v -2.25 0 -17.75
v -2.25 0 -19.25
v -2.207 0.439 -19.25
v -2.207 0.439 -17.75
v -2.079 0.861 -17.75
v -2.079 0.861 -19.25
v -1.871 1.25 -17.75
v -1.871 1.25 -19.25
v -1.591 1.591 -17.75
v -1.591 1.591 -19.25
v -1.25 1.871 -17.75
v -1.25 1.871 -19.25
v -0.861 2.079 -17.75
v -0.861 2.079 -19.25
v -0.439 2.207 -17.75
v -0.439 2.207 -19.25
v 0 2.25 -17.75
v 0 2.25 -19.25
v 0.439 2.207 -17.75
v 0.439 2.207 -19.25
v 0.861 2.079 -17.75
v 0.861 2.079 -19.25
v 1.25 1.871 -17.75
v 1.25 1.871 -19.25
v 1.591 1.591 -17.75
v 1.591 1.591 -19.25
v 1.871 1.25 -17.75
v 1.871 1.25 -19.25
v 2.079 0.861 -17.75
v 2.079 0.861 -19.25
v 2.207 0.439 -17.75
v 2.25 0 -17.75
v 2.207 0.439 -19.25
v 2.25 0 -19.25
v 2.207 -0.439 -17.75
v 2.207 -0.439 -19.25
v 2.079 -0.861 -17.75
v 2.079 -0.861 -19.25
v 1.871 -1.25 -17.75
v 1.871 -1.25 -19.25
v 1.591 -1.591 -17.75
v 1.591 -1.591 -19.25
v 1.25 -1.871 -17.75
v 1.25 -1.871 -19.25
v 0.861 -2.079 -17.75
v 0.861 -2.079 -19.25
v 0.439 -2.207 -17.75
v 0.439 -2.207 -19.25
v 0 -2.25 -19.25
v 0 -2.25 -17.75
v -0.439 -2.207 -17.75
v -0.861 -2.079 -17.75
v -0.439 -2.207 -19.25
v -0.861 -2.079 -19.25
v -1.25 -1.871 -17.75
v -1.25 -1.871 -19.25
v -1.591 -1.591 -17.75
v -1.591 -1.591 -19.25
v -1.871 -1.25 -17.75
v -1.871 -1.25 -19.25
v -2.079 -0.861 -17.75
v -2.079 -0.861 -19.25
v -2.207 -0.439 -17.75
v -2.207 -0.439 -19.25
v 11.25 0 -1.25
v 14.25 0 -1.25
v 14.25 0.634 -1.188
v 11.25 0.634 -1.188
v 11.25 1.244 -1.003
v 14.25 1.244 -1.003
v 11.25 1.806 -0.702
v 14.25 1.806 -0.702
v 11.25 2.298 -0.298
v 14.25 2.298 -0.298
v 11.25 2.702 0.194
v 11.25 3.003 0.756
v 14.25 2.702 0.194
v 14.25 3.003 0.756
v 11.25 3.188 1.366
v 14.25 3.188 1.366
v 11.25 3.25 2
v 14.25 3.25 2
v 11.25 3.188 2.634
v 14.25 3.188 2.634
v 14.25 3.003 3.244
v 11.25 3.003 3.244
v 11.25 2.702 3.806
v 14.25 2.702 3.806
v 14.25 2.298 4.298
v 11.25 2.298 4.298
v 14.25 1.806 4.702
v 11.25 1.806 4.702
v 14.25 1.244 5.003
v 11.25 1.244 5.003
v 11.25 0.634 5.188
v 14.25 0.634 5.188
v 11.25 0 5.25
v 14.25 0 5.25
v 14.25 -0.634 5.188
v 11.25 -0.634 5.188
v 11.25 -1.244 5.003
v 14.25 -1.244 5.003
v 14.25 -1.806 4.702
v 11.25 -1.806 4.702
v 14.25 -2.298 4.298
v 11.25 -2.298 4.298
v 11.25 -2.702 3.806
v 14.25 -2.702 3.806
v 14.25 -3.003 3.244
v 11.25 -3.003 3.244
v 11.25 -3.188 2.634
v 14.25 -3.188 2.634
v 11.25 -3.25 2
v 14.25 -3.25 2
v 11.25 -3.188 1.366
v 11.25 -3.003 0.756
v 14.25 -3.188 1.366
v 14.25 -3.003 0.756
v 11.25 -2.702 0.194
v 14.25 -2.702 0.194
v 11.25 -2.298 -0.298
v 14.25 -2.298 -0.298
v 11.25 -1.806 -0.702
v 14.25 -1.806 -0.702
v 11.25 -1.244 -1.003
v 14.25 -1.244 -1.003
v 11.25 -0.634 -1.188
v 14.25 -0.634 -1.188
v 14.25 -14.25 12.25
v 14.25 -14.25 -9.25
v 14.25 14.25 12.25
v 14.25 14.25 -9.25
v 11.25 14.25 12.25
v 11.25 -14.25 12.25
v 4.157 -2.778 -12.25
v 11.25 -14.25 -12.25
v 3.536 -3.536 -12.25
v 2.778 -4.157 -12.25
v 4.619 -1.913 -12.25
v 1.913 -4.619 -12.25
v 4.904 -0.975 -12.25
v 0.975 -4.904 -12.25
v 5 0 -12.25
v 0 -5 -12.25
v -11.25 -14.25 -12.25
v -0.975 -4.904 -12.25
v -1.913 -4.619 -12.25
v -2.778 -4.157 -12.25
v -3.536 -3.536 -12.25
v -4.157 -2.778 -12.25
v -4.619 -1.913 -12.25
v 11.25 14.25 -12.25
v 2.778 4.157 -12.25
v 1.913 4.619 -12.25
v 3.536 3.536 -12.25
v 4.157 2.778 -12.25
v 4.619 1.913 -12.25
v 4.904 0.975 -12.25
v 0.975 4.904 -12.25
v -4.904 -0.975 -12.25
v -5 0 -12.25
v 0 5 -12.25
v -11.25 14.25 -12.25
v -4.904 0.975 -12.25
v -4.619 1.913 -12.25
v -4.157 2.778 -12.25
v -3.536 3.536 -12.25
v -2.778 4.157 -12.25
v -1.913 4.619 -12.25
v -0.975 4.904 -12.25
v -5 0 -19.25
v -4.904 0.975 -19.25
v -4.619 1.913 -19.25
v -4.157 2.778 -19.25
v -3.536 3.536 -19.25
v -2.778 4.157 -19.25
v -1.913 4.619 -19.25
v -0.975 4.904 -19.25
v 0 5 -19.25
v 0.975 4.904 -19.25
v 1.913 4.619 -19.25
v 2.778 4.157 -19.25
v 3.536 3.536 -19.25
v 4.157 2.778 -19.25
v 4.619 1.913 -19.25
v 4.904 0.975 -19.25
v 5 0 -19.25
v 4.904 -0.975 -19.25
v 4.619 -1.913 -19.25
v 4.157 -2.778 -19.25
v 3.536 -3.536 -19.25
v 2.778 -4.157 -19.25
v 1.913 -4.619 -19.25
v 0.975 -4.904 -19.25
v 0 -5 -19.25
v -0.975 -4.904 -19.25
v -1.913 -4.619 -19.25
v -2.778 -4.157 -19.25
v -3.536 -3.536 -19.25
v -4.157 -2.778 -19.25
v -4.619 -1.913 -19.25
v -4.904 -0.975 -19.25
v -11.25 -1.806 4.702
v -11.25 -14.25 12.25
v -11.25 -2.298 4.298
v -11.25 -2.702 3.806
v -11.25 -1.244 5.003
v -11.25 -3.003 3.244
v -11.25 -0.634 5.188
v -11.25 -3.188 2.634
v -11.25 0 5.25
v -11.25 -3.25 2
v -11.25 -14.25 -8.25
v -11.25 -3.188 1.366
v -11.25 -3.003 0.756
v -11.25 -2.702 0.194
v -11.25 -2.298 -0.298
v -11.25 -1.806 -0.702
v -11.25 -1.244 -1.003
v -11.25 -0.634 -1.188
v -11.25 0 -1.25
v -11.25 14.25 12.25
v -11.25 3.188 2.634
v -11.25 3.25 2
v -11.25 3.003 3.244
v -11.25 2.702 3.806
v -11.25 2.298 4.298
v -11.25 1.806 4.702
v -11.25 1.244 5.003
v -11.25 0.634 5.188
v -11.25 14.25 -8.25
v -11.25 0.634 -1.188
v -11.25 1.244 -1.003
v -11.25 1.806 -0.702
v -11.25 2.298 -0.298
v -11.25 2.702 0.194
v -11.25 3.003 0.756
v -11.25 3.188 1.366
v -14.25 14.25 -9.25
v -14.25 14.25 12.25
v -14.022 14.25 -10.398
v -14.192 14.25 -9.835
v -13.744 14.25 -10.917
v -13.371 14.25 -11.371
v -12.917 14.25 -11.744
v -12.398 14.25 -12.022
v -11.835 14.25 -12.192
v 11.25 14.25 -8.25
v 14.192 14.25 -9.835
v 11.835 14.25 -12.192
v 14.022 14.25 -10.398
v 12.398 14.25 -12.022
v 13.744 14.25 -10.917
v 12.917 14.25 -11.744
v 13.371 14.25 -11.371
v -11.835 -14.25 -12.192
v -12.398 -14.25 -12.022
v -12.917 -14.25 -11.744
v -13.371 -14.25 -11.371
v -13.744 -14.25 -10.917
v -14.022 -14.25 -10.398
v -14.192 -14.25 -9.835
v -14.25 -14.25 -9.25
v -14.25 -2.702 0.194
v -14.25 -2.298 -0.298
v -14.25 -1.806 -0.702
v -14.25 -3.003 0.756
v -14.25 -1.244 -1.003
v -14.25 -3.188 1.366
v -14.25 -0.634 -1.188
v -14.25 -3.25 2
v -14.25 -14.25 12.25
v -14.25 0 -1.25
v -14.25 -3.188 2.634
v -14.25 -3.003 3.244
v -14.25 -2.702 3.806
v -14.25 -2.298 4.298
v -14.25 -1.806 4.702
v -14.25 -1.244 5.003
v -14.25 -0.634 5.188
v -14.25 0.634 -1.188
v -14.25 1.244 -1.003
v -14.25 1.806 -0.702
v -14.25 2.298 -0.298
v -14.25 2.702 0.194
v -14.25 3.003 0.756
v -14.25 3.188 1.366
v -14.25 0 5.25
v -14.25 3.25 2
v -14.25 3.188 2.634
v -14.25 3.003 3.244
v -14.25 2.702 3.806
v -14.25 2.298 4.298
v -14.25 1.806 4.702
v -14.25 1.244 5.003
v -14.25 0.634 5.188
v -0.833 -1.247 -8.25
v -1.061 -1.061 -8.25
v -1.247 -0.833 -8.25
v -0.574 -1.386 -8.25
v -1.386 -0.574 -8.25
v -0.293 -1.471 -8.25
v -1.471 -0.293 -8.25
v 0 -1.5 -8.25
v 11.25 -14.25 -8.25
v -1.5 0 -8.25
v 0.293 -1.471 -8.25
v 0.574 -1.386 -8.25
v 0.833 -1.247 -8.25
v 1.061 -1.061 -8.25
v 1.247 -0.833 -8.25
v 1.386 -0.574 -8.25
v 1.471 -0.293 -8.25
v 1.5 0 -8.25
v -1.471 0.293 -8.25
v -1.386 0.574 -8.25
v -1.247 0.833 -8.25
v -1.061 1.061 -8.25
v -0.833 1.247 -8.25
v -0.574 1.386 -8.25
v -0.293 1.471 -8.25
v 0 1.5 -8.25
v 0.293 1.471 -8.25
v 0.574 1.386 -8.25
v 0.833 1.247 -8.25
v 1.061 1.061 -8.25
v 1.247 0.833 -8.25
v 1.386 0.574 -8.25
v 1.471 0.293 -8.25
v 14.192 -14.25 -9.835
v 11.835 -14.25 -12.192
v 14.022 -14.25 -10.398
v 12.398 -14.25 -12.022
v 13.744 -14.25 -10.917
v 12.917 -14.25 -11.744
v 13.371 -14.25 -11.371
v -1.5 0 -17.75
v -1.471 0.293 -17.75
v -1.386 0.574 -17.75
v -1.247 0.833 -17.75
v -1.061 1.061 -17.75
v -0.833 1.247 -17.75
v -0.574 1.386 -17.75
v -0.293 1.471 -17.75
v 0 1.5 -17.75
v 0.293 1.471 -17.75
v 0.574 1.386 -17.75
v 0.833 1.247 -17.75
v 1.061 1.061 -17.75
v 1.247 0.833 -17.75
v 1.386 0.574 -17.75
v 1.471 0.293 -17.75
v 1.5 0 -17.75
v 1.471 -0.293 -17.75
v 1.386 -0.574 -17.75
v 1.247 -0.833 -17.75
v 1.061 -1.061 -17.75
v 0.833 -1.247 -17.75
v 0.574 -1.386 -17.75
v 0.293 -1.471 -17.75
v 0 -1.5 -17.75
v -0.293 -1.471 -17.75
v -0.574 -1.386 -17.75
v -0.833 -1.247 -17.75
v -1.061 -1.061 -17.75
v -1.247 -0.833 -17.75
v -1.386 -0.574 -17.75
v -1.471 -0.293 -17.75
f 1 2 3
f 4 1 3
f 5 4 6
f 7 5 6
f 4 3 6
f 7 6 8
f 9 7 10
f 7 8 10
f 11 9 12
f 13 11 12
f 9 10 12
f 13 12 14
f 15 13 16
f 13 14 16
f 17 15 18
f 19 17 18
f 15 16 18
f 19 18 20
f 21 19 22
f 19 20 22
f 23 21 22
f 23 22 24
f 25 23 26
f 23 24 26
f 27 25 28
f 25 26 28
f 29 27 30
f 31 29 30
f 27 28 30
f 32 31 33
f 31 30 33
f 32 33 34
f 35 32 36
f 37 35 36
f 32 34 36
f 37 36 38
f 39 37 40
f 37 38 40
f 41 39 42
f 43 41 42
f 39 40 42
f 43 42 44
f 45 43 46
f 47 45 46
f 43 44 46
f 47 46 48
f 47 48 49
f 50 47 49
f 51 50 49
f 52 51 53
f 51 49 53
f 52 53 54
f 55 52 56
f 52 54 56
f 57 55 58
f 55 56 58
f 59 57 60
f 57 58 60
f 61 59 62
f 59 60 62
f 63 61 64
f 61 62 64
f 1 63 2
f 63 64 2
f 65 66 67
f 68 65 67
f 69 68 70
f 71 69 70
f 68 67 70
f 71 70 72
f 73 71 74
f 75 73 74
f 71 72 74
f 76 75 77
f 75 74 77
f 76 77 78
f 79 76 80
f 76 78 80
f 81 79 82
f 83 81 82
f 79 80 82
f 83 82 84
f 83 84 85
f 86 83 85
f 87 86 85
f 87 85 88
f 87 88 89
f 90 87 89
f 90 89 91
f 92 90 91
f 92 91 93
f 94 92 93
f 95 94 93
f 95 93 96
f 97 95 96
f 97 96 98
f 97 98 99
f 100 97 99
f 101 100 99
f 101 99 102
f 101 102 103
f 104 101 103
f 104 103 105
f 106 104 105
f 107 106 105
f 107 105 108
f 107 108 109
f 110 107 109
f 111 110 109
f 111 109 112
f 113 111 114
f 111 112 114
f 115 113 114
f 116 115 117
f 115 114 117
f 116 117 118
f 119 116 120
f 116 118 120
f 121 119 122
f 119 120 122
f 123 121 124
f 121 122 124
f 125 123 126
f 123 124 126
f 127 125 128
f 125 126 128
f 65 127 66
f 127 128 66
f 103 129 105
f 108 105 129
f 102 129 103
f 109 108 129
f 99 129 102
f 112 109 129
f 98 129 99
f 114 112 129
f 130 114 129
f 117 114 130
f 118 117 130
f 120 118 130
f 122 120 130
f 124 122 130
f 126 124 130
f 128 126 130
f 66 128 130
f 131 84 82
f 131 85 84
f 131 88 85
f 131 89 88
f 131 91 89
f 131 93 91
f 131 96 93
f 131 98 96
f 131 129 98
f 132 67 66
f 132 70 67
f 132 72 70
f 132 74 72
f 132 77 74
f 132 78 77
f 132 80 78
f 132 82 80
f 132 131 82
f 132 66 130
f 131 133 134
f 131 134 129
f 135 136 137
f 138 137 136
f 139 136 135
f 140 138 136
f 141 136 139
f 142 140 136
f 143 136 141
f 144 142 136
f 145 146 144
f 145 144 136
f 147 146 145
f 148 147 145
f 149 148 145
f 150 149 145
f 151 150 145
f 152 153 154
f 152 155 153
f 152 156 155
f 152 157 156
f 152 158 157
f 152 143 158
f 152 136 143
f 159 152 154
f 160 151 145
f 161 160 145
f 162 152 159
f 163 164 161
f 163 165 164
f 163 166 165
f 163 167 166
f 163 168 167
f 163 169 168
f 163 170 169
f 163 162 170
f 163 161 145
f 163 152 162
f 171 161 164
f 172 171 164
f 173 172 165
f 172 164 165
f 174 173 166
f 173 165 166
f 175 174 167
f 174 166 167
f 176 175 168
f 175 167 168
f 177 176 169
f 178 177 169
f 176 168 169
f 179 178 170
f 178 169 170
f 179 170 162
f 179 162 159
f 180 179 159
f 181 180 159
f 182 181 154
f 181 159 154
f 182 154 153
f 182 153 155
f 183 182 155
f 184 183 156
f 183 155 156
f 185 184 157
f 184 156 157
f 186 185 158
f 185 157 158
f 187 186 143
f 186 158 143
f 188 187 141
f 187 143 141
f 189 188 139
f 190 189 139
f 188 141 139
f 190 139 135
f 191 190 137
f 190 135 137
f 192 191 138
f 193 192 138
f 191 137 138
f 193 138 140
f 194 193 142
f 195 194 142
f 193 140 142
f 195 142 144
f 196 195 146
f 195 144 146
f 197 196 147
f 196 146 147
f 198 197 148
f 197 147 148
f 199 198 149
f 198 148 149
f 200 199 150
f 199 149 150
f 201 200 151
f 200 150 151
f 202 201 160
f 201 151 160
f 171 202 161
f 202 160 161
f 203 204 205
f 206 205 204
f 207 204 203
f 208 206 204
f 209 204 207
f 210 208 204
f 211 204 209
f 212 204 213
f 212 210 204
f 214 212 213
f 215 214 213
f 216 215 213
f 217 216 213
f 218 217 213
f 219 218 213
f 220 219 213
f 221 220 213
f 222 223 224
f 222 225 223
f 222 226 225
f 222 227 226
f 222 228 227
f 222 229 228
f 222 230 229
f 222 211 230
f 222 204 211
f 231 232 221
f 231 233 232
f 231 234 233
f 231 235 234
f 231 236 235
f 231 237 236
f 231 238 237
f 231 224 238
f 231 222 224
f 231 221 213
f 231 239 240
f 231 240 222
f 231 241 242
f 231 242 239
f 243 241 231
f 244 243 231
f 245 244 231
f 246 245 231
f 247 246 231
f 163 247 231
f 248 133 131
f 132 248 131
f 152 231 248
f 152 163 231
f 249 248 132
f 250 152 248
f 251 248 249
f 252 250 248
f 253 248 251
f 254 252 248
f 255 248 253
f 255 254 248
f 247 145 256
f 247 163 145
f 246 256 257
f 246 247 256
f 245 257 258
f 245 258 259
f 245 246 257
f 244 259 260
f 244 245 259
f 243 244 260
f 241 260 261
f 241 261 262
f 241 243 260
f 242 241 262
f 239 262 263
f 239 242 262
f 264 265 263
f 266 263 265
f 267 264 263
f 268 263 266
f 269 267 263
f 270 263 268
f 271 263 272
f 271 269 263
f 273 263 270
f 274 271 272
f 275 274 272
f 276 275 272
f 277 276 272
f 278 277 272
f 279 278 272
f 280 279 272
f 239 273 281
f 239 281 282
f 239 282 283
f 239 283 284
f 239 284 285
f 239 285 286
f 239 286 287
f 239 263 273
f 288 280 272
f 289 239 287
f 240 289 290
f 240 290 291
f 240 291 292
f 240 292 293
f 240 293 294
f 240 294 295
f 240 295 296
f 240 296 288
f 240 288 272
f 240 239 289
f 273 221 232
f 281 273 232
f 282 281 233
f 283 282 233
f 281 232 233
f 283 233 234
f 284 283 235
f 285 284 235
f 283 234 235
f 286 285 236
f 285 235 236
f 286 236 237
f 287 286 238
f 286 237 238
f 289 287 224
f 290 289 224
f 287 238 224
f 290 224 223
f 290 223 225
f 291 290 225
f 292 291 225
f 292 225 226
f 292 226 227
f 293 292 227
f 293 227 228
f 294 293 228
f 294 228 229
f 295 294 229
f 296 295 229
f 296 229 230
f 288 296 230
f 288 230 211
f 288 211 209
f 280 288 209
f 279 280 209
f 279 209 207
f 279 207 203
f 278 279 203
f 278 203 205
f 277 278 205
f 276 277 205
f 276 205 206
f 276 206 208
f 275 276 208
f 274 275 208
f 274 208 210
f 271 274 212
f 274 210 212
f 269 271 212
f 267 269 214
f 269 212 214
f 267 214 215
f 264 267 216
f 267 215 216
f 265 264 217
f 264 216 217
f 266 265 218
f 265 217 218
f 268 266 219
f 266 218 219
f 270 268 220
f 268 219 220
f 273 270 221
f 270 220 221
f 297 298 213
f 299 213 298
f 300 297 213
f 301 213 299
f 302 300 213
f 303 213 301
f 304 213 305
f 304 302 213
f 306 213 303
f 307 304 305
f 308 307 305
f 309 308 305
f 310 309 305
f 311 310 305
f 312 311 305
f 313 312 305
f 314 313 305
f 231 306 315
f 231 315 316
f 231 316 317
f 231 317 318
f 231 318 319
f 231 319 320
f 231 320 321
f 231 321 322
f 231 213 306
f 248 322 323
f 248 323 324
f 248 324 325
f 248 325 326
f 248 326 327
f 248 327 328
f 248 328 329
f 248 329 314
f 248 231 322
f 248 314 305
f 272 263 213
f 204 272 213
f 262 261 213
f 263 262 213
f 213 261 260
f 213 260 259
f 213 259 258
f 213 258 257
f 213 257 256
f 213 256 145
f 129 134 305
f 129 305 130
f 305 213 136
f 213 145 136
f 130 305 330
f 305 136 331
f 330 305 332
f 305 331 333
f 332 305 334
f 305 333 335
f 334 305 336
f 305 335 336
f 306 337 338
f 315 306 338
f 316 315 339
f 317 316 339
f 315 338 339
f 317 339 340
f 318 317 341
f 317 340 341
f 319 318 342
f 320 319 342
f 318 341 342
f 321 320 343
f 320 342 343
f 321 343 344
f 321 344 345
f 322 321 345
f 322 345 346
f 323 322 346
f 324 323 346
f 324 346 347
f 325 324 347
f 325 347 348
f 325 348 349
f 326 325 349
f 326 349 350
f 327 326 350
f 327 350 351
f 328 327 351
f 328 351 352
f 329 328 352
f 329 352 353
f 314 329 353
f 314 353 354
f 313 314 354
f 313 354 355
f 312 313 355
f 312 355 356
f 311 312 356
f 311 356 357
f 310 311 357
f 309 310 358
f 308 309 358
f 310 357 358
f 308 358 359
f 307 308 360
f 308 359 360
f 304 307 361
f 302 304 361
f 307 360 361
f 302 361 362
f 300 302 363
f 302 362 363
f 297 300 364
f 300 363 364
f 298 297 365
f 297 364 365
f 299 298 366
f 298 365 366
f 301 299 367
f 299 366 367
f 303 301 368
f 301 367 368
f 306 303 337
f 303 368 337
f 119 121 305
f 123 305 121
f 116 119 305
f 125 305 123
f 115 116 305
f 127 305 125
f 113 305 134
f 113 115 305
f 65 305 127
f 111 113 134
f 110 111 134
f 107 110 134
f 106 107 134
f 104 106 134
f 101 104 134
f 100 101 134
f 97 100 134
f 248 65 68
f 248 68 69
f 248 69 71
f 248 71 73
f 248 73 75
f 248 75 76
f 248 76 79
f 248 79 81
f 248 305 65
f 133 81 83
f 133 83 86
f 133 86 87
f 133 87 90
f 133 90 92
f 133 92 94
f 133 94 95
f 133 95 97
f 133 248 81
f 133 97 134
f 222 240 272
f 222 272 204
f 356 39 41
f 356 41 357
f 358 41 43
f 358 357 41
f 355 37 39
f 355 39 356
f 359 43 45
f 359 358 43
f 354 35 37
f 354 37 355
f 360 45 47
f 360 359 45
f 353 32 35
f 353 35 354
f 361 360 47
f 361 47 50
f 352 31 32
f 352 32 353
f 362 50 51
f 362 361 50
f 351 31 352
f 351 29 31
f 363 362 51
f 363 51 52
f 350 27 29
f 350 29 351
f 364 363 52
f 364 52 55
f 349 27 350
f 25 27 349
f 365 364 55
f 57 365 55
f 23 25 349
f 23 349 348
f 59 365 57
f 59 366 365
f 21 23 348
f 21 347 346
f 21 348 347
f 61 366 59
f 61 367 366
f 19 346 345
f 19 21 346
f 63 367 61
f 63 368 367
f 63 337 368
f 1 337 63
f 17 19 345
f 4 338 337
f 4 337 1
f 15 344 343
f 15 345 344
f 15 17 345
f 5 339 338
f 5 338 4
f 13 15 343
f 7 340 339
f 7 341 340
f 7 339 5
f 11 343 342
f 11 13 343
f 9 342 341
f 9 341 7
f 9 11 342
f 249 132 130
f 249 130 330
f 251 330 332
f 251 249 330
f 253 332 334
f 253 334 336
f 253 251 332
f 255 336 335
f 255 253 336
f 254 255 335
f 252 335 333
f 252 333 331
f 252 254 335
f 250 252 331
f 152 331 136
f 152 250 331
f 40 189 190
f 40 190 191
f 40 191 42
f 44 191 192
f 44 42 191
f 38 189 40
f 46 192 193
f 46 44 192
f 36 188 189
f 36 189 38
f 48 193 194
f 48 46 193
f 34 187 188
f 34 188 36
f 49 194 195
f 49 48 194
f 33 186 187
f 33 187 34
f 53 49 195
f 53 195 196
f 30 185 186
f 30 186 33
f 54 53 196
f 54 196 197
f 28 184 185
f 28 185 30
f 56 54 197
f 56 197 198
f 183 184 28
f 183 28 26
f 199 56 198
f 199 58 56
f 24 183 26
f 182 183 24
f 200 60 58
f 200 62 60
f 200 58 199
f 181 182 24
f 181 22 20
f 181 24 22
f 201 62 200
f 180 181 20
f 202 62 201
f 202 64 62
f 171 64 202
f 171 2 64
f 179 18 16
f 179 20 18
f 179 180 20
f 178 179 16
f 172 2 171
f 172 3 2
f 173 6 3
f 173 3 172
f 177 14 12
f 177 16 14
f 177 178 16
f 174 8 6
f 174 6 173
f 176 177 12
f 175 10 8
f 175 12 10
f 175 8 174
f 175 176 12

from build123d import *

# Parameters (mm, degrees)
BOSS_EXTRUDE1_DEPTH      = 14.25
BOSS_EXTRUDE1_DEPTH_BACK = 14.25
SKETCH2_R                = 5
BOSS_EXTRUDE2_DEPTH      = 7
SKETCH3_R                = 2.25
CUT_EXTRUDE1_DEPTH       = 1.5
SKETCH4_R                = 1.5
CUT_EXTRUDE2_DEPTH       = 10.5
SKETCH5_R                = 3.25
CUT_EXTRUDE3_DEPTH       = 32.5


with BuildPart() as part:
    # Sketch1 → Boss-Extrude1 (new, two sides: drawn at the far end of the back side and taken through both)
    with BuildSketch(Plane(origin=(0, 0, 0), x_dir=(1, 0, 0), z_dir=(0, 1, 0)).offset(-BOSS_EXTRUDE1_DEPTH_BACK)):
        with BuildLine():
            Line((-14.25, 9.25), (-14.25, -12.25))
            Line((-14.25, -12.25), (-11.25, -12.25))
            Line((-11.25, -12.25), (-11.25, 8.25))
            Line((-11.25, 8.25), (11.25, 8.25))
            Line((11.25, 8.25), (11.25, -12.25))
            Line((11.25, -12.25), (14.25, -12.25))
            Line((14.25, -12.25), (14.25, 9.25))
            ThreePointArc((14.25, 9.25), (13.371320344, 11.371320344), (11.25, 12.25))
            Line((11.25, 12.25), (-11.25, 12.25))
            ThreePointArc((-11.25, 12.25), (-13.371320344, 11.371320344), (-14.25, 9.25))
        make_face()
    extrude(amount=BOSS_EXTRUDE1_DEPTH + BOSS_EXTRUDE1_DEPTH_BACK)

    # Sketch2 → Boss-Extrude2 (add)
    with BuildSketch(Plane(origin=(0, 0, -12.25), x_dir=(-1, 0, 0), z_dir=(0, 0, -1))):
        Circle(SKETCH2_R)
    extrude(amount=BOSS_EXTRUDE2_DEPTH)

    # Sketch3 → Cut-Extrude1 (cut)
    with BuildSketch(Plane(origin=(0, 0, -19.25), x_dir=(-1, 0, 0), z_dir=(0, 0, -1))):
        Circle(SKETCH3_R)
    extrude(amount=-CUT_EXTRUDE1_DEPTH, mode=Mode.SUBTRACT)

    # Sketch4 → Cut-Extrude2 (cut)
    with BuildSketch(Plane(origin=(0, 0, -17.75), x_dir=(-1, 0, 0), z_dir=(0, 0, -1))):
        Circle(SKETCH4_R)
    extrude(amount=-CUT_EXTRUDE2_DEPTH, mode=Mode.SUBTRACT)

    # Sketch5 → Cut-Extrude3 (cut)
    with BuildSketch(Plane(origin=(14.25, 0, 0), x_dir=(0, 0, -1), z_dir=(1, 0, 0))):
        with Locations((-2, 0)):
            Circle(SKETCH5_R)
    extrude(amount=-CUT_EXTRUDE3_DEPTH, mode=Mode.SUBTRACT)


solid = part.part
